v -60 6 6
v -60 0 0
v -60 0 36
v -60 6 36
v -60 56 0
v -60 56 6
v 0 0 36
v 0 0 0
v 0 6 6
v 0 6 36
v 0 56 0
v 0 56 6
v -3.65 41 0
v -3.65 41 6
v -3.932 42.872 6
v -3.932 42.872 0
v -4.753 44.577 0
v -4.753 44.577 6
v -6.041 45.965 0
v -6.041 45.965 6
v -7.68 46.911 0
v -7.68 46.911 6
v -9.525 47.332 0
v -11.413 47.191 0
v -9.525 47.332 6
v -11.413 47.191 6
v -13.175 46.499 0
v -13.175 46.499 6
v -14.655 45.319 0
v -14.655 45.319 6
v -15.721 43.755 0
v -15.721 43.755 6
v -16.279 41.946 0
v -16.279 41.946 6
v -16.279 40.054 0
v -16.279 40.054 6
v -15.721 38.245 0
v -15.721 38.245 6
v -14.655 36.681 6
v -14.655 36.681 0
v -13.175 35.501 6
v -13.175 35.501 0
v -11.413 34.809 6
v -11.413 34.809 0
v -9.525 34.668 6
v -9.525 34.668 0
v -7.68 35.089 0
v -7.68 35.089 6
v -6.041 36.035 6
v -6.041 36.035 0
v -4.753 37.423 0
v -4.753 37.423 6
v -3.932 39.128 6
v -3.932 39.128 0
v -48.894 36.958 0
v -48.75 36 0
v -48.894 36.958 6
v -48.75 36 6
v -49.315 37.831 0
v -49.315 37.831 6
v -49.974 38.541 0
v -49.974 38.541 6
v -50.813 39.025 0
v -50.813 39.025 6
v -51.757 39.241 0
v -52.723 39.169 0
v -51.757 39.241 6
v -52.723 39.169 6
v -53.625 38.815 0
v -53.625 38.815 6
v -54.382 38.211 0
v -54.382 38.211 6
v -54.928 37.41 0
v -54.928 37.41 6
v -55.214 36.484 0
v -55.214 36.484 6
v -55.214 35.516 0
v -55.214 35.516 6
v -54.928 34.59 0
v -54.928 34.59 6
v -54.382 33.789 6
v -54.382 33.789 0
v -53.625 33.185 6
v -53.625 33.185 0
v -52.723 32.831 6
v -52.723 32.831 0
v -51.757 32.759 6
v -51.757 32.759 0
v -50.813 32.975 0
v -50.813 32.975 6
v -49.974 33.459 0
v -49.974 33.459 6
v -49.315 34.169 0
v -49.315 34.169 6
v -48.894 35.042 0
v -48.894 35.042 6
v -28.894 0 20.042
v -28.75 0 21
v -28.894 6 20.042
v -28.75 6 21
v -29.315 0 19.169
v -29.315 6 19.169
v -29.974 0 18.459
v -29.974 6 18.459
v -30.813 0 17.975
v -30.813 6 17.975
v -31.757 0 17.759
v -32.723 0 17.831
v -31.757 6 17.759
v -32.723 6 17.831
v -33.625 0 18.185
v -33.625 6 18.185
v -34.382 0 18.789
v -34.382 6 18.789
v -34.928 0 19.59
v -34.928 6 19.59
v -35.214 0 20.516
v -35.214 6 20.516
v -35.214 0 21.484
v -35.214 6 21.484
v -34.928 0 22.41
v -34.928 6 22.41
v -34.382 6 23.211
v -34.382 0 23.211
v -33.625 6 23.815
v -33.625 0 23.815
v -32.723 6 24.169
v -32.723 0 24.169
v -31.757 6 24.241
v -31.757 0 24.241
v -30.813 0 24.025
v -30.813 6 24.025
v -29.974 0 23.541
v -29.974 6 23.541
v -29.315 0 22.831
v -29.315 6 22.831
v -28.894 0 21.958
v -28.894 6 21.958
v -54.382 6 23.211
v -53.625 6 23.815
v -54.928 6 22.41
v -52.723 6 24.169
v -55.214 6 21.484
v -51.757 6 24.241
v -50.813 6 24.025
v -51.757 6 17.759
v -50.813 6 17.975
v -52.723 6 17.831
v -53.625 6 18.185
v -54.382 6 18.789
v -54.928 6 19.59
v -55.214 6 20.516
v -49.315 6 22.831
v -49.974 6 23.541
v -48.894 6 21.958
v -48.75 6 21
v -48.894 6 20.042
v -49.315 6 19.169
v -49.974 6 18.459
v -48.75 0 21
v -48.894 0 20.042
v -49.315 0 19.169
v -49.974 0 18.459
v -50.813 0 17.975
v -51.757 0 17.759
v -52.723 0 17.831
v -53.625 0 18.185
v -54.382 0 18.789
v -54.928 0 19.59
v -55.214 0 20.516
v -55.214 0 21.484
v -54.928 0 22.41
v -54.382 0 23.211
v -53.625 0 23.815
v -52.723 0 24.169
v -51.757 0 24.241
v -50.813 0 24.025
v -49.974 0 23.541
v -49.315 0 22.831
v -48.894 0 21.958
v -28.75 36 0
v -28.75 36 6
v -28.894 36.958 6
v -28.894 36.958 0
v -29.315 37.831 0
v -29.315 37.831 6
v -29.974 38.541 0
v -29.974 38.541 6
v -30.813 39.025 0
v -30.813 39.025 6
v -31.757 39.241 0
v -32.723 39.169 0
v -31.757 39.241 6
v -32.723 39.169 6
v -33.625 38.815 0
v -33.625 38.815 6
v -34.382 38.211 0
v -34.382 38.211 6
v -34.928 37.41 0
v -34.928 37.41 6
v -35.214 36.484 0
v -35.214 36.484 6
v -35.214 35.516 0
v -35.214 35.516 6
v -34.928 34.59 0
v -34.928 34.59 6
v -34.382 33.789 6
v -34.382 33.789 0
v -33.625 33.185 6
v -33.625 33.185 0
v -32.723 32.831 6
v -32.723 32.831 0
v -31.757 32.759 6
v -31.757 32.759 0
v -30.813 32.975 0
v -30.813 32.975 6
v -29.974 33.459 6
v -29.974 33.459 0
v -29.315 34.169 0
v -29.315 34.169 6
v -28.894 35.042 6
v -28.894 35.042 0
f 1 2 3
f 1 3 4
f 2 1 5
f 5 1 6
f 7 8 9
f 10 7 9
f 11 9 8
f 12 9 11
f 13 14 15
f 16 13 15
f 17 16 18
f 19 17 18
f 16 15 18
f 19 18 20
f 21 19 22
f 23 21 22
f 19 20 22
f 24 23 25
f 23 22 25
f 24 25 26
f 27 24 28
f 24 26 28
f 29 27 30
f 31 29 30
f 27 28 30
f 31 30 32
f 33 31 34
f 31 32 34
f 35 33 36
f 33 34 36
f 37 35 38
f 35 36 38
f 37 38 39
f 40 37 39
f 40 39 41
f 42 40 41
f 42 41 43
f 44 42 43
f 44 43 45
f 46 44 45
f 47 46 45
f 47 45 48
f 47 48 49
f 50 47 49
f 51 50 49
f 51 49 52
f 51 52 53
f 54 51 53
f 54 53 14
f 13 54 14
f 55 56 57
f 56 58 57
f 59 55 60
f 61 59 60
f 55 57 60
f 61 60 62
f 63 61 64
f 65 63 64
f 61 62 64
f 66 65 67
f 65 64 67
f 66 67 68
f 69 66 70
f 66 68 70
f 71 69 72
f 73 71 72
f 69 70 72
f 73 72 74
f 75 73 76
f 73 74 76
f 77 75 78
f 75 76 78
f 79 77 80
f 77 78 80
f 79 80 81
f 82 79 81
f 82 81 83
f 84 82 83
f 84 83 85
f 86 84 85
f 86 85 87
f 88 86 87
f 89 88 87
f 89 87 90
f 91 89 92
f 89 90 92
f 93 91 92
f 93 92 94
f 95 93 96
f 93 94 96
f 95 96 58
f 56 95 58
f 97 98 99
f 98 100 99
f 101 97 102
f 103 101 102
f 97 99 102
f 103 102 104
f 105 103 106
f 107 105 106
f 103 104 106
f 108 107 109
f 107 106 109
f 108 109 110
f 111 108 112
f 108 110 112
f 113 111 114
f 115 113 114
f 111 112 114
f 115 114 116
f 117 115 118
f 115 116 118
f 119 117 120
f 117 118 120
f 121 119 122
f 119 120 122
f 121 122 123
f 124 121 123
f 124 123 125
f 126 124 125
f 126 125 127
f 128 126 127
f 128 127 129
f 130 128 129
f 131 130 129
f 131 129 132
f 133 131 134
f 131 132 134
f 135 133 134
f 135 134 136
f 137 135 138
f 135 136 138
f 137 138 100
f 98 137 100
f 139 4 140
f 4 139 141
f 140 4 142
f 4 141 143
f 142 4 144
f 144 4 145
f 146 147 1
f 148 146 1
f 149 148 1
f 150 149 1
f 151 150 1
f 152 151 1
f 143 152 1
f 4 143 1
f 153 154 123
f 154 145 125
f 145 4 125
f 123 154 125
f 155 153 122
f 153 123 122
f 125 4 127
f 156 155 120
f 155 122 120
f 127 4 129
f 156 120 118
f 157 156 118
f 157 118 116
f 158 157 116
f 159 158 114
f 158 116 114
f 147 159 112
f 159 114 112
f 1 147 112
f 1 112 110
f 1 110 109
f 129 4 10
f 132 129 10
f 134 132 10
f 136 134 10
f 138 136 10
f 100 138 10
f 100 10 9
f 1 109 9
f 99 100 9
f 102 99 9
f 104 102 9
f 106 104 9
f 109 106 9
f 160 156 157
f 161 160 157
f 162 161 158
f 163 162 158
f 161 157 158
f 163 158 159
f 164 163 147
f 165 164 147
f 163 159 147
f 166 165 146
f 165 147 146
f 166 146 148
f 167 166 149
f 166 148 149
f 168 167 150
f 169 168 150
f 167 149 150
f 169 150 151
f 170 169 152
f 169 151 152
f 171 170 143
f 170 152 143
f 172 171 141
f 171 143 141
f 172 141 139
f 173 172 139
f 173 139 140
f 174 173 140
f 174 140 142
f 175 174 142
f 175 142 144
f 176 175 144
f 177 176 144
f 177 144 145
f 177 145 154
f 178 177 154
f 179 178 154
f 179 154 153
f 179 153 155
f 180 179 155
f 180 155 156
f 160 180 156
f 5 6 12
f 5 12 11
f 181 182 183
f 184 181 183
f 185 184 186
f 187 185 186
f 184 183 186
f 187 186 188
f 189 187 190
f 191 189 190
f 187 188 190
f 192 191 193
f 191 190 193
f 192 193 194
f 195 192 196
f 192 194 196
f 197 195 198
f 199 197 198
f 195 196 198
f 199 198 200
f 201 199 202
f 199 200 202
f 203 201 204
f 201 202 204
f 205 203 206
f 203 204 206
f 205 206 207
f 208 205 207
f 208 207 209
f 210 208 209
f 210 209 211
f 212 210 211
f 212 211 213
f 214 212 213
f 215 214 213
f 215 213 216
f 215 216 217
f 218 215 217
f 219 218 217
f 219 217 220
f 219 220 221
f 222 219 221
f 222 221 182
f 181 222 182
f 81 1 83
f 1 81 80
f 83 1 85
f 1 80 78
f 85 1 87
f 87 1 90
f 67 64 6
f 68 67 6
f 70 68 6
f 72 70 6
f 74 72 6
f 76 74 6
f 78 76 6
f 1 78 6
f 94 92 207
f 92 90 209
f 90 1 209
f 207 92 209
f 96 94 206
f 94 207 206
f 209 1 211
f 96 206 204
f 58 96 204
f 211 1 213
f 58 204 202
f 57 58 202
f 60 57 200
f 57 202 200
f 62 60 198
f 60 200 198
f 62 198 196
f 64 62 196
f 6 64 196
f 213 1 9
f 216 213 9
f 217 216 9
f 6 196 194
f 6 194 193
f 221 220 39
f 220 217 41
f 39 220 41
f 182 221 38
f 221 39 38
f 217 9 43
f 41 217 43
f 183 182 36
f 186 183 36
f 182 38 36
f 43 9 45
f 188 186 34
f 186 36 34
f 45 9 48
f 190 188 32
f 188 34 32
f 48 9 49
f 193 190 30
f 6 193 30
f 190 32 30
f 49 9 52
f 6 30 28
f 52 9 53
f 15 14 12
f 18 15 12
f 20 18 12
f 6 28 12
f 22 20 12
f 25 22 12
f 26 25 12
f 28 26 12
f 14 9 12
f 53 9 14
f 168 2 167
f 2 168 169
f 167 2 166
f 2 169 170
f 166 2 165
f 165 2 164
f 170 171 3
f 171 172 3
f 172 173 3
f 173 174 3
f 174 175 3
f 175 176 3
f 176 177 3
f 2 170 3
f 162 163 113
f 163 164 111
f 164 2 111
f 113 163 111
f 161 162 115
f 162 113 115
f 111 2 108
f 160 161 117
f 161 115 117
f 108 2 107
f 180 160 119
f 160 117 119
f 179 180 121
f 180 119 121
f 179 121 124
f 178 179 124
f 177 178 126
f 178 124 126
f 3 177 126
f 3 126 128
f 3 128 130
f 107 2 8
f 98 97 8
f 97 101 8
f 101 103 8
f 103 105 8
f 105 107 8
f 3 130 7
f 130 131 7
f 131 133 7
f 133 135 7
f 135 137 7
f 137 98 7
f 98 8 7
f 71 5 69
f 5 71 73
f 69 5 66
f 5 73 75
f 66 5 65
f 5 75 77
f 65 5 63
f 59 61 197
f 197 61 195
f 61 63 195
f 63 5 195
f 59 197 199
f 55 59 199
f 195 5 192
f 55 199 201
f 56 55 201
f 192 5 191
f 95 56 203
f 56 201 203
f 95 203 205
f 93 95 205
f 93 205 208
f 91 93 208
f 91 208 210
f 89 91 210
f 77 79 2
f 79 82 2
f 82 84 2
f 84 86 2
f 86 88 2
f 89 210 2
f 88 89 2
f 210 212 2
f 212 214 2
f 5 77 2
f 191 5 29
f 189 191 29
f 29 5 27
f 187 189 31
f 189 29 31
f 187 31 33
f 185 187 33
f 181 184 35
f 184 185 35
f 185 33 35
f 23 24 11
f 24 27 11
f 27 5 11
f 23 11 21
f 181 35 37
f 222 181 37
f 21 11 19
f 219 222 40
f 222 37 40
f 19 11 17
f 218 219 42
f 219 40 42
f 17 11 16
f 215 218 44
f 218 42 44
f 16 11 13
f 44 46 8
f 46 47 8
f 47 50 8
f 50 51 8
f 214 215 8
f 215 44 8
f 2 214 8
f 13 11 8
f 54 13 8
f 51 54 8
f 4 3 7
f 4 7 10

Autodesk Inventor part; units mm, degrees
ref_plane "YZ Plane" through (0, 0, 0) normal (1, 0, 0) x (0, 1, 0)
ref_plane "XZ Plane" through (0, 0, 0) normal (0, 1, 0) x (-1, 0, 0)
ref_plane "XY Plane" through (0, 0, 0) normal (0, 0, 1) x (1, 0, 0)
sketch "Sketch1" plane through (0, 0, 0) normal (1, 0, 0) x (0, 1, 0)
  line L0 (0, 0) -> (0, 36)
  line L1 (0, 36) -> (6, 36)
  line L2 (6, 36) -> (6, 6)
  line L3 (6, 6) -> (56, 6)
  line L4 (56, 6) -> (56, 0)
  line L5 (56, 0) -> (0, 0)
  dimension "d0" = 36
  dimension "d1" = 6
  dimension "d2" = 30
  dimension "d3" = 50
  dimension "d4" = 6
  dimension "d5" = 56
extrude "Extrusion1" add sketch "Sketch1" against normal blind 60
sketch "Sketch2" plane through (0, 6, 36) normal (0, 1, 0) x (1, 0, 0)
  circle A0 centre (-52, 15) radius 3.25
  circle A1 centre (-32, 15) radius 3.25
  line L0 (0, 0) -> (-60, 0) projected
  line L1 (0, 30) -> (0, 0) projected
  line L2 (-60, 0) -> (-60, 30) projected
  line L3 (-60, 30) -> (-20.277, 30) construction
  point P0 (0, 36)
  point P1 (-5.4498, 30)
  dimension "d8" = 6.5
  dimension "d9" = 6.5
  dimension "d10" = 20
  dimension "d11" = 15
  dimension "d12" = 15
  dimension "d13" = 32
sketch "Sketch3" plane through (0, 6, 6) normal (0, 0, 1) x (1, 0, 0)
  circle A0 centre (-52, 30) radius 3.25
  line L0 (-60, 0) -> (-60, 50) projected
  line L1 (0, 50) -> (-60, 50) projected
  circle A1 centre (-32, 30) radius 3.25
  point P0 (0, -6)
  dimension "d14" = 6.5
  dimension "d15" = 8
  dimension "d16" = 20
  dimension "d17" = 6.5
  dimension "d18" = 20
  dimension "d27" = 50
extrude "Extrusion2" cut sketch "Sketch3" against normal blind 6
extrude "Extrusion3" cut sketch "Sketch2" against normal blind 6
sketch "Sketch4" plane through (0, 6, 6) normal (0, 0, 1) x (1, 0, 0)
  circle A0 centre (-10, 35) radius 6.35
  line L0 (0, 50) -> (0, 0) projected
  line L1 (0, 50) -> (-60, 50) projected
  line L2 (-60, 0) -> (-60, 50) projected
  point P0 (0, -6)
  point P1 (0, 25)
  dimension "d23" = 12.7
  dimension "d28" = 15
  dimension "d29" = 50
extrude "Extrusion4" cut sketch "Sketch4" against normal blind 6
properties part number "Base_Connector1"
